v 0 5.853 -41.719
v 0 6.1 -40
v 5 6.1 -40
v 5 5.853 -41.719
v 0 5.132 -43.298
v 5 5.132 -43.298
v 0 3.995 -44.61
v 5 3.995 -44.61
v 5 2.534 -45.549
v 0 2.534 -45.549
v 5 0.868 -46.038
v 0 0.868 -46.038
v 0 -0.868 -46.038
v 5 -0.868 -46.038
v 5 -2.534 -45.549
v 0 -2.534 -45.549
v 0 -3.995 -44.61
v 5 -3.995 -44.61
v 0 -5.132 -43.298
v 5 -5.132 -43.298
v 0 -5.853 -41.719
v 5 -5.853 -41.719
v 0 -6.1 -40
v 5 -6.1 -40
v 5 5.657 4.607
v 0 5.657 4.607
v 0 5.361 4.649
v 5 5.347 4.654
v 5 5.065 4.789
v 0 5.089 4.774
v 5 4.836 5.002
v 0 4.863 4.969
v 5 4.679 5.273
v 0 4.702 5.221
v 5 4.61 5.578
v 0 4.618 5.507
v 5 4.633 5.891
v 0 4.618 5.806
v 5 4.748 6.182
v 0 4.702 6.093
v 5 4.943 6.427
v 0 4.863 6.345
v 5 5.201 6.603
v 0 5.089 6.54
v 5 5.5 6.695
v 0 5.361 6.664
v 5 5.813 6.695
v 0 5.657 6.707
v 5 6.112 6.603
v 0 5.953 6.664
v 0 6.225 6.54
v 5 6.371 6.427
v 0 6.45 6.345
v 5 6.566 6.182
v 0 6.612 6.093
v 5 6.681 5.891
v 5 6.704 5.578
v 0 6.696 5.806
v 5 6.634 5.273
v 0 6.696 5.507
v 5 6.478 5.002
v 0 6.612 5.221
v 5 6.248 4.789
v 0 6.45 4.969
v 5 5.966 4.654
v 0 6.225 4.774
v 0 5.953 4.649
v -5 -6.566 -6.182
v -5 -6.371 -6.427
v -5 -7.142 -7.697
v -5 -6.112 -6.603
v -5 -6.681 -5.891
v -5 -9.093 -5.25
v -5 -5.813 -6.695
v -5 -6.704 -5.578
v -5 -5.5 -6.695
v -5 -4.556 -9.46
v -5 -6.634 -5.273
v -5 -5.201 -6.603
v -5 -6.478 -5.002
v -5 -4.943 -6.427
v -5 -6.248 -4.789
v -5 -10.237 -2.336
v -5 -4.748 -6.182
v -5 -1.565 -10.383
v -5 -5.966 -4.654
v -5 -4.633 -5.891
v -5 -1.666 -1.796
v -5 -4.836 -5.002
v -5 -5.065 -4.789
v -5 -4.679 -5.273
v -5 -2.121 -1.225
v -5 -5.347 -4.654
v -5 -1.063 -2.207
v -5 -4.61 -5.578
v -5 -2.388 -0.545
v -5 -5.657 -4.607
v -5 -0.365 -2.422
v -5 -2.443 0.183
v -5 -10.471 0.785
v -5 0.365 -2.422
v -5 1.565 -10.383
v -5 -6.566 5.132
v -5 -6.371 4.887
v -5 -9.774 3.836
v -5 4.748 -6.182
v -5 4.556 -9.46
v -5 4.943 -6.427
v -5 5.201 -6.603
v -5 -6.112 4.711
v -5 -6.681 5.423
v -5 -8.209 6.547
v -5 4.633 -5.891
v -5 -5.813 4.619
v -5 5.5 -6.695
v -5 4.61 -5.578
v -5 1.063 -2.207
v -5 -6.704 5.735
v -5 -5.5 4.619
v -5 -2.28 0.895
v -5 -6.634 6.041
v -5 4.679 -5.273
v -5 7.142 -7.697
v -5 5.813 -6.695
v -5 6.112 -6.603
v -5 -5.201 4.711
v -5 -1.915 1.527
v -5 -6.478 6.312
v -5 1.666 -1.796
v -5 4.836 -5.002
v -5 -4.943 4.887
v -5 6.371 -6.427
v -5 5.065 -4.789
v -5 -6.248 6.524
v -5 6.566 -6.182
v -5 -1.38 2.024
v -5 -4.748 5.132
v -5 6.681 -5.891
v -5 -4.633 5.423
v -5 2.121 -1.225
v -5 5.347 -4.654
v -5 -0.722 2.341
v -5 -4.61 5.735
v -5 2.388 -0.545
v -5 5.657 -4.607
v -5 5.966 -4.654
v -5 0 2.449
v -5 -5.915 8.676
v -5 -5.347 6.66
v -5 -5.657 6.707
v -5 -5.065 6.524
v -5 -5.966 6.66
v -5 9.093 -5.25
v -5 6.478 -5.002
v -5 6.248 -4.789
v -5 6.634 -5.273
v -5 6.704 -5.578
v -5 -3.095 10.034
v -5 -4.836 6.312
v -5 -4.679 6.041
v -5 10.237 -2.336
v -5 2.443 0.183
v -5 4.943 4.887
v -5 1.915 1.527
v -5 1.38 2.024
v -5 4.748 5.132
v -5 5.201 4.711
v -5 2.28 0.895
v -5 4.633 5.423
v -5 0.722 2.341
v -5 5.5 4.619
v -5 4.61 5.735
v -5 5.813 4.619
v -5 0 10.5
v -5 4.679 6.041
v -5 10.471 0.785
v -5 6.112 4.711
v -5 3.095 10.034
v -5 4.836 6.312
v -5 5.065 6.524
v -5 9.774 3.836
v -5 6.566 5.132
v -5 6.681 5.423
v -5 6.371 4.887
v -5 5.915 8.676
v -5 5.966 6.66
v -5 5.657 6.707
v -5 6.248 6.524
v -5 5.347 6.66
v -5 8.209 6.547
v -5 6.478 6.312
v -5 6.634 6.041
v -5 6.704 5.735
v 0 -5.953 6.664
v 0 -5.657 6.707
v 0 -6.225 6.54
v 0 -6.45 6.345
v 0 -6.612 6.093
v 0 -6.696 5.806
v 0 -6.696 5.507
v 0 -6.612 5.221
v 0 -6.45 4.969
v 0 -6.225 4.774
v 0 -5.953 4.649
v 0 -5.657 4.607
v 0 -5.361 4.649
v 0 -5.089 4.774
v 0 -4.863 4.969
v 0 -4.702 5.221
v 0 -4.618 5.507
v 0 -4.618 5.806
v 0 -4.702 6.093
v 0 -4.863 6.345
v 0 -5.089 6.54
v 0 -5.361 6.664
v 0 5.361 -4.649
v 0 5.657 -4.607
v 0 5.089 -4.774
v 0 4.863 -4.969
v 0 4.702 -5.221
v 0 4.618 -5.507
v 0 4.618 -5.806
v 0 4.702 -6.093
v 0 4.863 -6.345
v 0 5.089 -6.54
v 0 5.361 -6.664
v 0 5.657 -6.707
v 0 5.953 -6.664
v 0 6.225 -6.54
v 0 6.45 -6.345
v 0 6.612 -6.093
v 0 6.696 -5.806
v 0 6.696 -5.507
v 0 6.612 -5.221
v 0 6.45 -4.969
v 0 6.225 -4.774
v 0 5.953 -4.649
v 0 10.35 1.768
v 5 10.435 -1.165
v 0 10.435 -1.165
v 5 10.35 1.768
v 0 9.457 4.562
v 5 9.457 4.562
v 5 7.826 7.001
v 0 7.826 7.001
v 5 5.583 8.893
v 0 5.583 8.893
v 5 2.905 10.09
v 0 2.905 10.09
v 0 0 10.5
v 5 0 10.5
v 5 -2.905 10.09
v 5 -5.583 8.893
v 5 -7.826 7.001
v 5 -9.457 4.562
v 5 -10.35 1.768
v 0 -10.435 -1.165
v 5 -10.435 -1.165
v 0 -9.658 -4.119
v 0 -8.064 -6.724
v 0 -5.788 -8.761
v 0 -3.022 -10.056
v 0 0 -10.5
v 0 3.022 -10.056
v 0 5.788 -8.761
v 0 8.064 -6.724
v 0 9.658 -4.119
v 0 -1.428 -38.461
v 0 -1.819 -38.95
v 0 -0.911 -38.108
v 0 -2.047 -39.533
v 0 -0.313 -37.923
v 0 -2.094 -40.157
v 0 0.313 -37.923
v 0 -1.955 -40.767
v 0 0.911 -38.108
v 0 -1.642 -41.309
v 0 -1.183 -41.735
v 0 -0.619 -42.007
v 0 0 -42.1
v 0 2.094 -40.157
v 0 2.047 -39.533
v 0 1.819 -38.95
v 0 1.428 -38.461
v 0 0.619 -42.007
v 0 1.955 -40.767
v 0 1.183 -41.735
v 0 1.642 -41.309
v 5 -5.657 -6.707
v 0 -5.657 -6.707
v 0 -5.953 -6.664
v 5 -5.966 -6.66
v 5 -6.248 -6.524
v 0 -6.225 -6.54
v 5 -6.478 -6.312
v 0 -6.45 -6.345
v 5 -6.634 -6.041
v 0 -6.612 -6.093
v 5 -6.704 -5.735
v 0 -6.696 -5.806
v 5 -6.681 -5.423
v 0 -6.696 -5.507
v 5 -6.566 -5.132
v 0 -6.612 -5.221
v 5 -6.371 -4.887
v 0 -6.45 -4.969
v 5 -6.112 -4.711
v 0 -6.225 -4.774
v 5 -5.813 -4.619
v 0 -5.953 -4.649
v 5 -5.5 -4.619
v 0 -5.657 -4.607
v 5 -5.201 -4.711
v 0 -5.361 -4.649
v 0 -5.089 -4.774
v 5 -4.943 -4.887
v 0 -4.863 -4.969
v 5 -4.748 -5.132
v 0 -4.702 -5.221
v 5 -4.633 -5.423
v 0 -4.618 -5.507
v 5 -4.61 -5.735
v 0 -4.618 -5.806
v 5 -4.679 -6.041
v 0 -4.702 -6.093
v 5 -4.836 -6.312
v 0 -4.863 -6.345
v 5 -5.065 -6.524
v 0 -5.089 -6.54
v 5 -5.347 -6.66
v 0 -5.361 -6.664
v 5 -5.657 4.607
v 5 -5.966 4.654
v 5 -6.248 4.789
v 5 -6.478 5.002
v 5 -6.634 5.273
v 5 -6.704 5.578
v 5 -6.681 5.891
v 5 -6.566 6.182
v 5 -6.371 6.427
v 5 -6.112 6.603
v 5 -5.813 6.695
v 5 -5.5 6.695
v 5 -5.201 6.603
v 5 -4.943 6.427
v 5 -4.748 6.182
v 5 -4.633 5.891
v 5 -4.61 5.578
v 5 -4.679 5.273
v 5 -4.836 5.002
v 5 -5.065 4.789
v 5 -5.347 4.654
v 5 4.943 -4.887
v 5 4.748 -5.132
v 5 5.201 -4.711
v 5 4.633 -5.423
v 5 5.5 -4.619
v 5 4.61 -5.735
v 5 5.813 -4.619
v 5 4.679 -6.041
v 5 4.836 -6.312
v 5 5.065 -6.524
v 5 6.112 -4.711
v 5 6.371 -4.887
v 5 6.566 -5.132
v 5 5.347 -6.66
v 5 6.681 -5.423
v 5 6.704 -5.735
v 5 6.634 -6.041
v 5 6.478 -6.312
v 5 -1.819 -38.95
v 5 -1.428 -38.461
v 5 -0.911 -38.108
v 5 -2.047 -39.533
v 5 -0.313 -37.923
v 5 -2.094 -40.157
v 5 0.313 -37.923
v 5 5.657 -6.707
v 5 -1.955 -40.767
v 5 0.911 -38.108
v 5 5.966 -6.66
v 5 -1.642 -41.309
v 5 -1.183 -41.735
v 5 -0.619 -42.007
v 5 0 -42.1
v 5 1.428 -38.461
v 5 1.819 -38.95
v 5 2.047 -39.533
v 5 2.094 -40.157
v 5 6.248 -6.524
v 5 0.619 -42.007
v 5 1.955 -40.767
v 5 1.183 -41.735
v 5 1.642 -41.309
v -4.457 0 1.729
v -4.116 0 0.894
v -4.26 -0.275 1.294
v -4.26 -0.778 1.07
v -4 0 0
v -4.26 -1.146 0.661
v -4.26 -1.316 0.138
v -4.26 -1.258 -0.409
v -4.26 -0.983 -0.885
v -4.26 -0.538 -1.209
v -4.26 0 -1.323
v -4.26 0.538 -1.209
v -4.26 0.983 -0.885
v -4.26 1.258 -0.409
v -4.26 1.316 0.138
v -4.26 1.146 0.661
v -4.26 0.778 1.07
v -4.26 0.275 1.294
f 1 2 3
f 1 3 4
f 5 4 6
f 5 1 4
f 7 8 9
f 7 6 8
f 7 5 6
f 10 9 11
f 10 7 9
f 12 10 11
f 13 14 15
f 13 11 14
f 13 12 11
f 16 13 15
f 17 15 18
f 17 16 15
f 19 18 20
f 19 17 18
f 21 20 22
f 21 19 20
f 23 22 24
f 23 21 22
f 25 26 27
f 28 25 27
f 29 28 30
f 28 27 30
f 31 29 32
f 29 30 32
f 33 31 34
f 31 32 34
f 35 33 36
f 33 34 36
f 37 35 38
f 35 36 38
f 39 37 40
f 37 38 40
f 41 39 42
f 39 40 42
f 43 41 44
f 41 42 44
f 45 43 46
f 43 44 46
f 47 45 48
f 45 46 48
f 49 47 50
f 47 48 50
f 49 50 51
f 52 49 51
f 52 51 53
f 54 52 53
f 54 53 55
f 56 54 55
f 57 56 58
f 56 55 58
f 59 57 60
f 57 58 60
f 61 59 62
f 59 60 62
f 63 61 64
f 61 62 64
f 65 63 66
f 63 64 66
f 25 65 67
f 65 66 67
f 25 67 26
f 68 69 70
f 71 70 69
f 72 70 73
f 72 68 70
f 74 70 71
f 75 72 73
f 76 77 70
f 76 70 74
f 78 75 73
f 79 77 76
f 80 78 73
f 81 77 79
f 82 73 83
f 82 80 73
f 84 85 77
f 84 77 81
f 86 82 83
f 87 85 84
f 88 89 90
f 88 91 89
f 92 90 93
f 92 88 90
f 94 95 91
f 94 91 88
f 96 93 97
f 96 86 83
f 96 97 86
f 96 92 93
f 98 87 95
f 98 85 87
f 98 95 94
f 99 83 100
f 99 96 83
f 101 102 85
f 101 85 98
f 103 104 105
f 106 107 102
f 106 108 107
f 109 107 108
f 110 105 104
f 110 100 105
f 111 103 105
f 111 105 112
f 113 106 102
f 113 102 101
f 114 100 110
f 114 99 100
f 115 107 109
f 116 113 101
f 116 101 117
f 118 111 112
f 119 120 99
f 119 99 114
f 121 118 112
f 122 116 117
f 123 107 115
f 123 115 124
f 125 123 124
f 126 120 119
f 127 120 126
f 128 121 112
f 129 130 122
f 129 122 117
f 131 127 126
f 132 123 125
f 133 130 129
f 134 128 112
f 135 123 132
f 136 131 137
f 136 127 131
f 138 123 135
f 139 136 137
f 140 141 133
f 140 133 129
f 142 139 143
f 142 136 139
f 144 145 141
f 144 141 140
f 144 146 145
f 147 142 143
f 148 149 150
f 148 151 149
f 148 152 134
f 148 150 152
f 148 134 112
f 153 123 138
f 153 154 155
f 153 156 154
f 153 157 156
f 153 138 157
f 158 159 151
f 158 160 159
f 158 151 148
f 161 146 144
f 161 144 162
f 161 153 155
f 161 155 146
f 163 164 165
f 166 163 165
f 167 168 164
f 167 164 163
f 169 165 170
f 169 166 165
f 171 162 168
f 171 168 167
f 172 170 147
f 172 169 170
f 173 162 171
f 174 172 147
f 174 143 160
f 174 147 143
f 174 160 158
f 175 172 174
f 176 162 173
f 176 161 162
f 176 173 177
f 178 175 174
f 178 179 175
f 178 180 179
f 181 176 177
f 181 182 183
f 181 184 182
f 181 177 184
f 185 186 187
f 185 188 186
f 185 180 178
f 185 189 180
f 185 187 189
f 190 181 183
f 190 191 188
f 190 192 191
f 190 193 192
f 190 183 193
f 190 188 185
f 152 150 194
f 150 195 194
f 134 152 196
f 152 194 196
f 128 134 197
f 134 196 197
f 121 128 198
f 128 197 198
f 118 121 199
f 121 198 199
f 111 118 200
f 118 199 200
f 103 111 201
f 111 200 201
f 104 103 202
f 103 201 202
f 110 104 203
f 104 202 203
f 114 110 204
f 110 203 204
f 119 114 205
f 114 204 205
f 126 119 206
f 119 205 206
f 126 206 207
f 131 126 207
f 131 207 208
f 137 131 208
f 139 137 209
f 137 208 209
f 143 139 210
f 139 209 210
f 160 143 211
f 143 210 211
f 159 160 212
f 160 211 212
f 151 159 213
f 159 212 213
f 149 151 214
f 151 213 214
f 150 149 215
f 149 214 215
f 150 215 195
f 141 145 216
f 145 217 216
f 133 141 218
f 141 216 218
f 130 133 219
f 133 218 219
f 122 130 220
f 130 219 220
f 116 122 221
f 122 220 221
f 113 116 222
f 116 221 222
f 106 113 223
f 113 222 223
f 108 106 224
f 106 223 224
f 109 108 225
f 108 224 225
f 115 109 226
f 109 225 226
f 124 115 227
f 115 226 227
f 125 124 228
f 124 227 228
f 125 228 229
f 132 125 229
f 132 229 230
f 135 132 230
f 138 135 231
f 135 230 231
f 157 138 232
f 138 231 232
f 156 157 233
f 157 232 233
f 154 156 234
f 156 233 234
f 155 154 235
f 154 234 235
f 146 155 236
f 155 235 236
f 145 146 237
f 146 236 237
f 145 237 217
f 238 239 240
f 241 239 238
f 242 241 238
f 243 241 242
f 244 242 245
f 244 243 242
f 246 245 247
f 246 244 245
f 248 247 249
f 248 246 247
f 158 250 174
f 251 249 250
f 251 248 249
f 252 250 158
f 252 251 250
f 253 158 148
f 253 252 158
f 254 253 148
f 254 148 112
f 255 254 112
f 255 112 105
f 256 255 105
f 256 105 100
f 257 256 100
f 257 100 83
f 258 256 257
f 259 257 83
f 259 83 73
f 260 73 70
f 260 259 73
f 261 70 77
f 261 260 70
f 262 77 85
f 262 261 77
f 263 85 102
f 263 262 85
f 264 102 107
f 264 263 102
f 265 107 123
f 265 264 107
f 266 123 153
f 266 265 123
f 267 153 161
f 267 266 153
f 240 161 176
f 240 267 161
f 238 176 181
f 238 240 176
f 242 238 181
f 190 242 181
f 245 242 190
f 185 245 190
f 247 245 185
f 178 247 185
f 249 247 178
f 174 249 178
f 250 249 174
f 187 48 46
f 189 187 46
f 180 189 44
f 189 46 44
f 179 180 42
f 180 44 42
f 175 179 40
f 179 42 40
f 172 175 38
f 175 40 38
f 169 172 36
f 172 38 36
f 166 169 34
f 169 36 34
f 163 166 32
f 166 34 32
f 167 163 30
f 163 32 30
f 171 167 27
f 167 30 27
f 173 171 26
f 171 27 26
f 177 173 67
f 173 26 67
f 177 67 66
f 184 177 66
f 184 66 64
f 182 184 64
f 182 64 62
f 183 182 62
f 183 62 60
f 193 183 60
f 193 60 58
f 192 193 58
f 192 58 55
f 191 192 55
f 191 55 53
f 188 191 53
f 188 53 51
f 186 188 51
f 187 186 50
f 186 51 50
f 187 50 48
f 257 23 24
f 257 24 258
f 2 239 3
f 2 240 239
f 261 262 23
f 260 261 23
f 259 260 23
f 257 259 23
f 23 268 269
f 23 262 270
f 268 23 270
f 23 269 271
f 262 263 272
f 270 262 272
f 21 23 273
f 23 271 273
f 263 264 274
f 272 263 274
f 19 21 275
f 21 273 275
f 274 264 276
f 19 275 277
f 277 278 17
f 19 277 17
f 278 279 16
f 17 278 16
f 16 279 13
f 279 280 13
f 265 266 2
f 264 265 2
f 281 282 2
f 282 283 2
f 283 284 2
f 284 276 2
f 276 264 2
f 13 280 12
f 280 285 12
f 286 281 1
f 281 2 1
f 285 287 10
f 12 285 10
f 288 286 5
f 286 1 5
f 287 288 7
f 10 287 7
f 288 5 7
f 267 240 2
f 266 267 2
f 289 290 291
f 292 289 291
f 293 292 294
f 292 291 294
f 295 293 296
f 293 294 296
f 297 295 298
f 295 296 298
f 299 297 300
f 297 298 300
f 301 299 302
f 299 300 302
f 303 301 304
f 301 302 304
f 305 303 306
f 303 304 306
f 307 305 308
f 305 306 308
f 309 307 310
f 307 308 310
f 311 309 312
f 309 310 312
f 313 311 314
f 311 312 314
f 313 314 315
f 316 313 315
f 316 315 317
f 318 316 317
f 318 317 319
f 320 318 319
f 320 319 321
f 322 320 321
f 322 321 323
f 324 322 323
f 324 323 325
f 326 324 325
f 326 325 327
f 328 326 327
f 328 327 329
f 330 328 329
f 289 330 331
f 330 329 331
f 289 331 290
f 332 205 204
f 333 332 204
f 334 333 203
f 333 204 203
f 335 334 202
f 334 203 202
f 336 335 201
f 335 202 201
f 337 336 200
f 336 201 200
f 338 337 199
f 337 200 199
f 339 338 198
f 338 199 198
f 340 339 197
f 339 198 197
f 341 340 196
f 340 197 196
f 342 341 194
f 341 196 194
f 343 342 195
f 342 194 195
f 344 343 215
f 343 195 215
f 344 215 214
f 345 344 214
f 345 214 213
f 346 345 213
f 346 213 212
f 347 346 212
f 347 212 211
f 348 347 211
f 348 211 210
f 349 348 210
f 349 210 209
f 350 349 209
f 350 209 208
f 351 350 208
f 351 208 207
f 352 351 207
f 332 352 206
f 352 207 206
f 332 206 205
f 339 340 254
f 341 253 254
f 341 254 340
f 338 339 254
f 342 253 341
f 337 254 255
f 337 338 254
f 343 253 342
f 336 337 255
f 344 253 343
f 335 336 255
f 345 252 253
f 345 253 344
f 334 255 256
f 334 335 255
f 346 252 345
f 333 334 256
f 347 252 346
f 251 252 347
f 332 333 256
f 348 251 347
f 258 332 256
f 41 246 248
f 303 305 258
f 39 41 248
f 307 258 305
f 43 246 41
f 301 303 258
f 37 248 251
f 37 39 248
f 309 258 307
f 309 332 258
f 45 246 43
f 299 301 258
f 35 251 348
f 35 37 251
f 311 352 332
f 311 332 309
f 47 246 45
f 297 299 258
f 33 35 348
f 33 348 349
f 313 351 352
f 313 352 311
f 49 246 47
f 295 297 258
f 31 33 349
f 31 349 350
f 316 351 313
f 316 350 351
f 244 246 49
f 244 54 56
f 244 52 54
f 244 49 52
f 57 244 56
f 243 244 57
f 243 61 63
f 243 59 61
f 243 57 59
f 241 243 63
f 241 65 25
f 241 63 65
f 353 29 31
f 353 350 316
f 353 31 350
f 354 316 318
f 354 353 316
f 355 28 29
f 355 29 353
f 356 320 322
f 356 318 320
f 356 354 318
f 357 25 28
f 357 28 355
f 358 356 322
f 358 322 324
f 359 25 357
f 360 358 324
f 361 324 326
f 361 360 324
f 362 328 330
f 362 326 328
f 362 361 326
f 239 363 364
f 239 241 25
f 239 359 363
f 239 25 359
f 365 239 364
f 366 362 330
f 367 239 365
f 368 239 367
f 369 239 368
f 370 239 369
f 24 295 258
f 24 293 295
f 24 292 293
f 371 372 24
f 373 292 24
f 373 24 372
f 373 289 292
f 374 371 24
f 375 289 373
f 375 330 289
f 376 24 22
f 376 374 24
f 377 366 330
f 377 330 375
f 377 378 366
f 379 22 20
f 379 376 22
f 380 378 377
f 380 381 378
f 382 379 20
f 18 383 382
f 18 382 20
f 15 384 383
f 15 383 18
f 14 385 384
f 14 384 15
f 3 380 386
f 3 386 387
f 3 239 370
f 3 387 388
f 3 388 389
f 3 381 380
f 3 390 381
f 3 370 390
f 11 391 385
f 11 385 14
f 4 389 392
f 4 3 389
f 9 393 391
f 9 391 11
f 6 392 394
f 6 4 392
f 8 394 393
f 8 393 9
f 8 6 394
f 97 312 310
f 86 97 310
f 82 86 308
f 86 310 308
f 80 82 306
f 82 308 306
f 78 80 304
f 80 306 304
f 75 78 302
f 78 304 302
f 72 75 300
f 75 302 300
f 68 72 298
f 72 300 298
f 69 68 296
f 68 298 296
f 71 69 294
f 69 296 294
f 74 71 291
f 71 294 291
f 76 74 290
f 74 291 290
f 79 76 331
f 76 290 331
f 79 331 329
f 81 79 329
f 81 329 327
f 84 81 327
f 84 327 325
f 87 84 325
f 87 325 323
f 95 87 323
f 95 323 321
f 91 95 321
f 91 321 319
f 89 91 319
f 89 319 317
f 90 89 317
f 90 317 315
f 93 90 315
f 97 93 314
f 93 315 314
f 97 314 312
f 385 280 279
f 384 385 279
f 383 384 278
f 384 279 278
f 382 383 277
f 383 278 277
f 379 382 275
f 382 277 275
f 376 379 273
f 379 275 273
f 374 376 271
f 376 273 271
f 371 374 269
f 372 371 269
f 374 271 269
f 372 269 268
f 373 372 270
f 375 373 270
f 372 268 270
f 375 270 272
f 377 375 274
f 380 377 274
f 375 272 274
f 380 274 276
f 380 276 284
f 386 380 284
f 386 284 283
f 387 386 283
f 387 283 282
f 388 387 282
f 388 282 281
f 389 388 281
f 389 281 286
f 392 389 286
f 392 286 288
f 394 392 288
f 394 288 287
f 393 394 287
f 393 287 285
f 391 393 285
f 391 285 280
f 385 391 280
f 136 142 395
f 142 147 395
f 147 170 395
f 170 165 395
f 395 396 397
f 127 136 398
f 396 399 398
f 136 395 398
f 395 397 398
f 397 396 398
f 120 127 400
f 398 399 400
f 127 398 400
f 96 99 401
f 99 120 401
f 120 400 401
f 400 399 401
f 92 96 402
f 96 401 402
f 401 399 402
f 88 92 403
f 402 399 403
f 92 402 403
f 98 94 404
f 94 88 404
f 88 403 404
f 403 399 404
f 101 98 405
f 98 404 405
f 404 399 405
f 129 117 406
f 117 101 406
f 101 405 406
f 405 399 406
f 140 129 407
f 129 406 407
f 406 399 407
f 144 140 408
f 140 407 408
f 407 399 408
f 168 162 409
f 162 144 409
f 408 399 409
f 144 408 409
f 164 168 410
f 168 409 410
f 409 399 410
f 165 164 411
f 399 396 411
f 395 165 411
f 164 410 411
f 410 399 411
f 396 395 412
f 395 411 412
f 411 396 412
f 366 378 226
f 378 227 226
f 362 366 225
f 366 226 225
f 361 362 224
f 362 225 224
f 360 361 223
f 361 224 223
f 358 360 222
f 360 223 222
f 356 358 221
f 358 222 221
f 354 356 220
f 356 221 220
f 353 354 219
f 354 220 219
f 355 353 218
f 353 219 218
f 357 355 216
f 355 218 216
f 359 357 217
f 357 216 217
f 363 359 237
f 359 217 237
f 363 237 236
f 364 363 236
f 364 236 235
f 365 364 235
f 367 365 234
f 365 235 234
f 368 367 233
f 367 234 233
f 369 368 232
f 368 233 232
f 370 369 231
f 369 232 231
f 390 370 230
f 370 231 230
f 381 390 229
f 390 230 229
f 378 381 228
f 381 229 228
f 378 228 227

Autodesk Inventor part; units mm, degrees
ref_plane "YZ Plane" through (0, 0, 0) normal (1, 0, 0) x (0, 1, 0)
ref_plane "XZ Plane" through (0, 0, 0) normal (0, 1, 0) x (-1, 0, 0)
ref_plane "XY Plane" through (0, 0, 0) normal (0, 0, 1) x (1, 0, 0)
sketch "Esquisse2" plane through (0, 0, 0) normal (-1, 0, 0) x (0, 0, 1)
  circle A0 centre (0, 0) radius 8 construction
  circle A1 centre (0, 0) radius 10.5
  line L0 (0, 0) -> (5.6569, 5.6569) construction
  line L1 (0, 0) -> (8, 0) construction
  circle A2 centre (5.6569, 5.6569) radius 1.05
  circle A3 centre (-5.6569, 5.6569) radius 1.05
  circle A4 centre (-5.6569, -5.6569) radius 1.05
  circle A5 centre (5.6569, -5.6569) radius 1.05
  circle A6 centre (0, 0) radius 2 projected
  dimension "d30" = 16
  dimension "d13" = 45
  dimension "d14" = 2.1
  dimension "d17" = 360
  dimension "d29" = 21
extrude "Extrusion5" add sketch "Esquisse2" along normal blind 5 contours A1 | A6
sketch "Esquisse6" plane through (0, 0, 0) normal (0, 1, 0) x (-1, 0, 0)
  circle A0 centre (7.5, 0) radius 3.5
  line L0 (4, 0) -> (7.5, 0)
  line L1 (10.8, 0) -> (-1.8, 0) projected
  line L2 (5, -10.5) -> (5, 10.5) projected
  point P0 (0, 0)
  point P1 (5, 0)
  point P2 (5, 2.4495)
  dimension "d46" = 7
  dimension "d48" = 1
revolve "Révolution1" cut sketch "Esquisse6" angle 360 about axis through (-4, 0, 0) along (-1, 0, 0) picked at (4.8584, 1.4572) contours L2 L0 A0
sketch "Esquisse7" plane through (0, 0, 0) normal (1, 0, 0) x (0, 0, -1)
  circle A0 centre (0, 0) radius 10.5 projected
  circle A1 centre (-5.6569, -5.6569) radius 1.05 projected
  circle A2 centre (5.6569, -5.6569) radius 1.05 projected
  circle A3 centre (5.6569, 5.6569) radius 1.05 projected
  circle A4 centre (-5.6569, 5.6569) radius 1.05 projected
  circle A5 centre (0, 0) radius 10.5 projected
  line L0 (0, 10.5652) -> (40, 6.1)
  line L1 (40, 6.1) -> (40, -6.1)
  line L2 (40, -6.1) -> (0, -10.5652)
  line L3 (0, -10.5652) -> (0, 10.5652)
  arc A6 (40, -6.1) -> (40, 6.1) centre (40, 0) ccw
  circle A7 centre (40, 0) radius 2.1
  line L4 (0, -14.7913) -> (0, 14.7913) projected
  line L5 (57.42, 0) -> (-21.82, 0) projected
  point P0 (1.1649, 10.4352)
  point P1 (1.1649, -10.4352)
  dimension "d49" = 40
  dimension "d53" = 4.2
  dimension "d54" = 4
extrude "Extrusion9" add sketch "Esquisse7" along normal blind 5 contours L5 L3 A0 | L5 A7 L1 L2 A0 | A0 L0 L1 A7 L5 | A0 L3 L5 | L5 A0 L3 | L3 A0 L5 | A6 L5 A7 L1 | L1 A7 L5 A6
properties part number "Biellette moteur-doigts"
